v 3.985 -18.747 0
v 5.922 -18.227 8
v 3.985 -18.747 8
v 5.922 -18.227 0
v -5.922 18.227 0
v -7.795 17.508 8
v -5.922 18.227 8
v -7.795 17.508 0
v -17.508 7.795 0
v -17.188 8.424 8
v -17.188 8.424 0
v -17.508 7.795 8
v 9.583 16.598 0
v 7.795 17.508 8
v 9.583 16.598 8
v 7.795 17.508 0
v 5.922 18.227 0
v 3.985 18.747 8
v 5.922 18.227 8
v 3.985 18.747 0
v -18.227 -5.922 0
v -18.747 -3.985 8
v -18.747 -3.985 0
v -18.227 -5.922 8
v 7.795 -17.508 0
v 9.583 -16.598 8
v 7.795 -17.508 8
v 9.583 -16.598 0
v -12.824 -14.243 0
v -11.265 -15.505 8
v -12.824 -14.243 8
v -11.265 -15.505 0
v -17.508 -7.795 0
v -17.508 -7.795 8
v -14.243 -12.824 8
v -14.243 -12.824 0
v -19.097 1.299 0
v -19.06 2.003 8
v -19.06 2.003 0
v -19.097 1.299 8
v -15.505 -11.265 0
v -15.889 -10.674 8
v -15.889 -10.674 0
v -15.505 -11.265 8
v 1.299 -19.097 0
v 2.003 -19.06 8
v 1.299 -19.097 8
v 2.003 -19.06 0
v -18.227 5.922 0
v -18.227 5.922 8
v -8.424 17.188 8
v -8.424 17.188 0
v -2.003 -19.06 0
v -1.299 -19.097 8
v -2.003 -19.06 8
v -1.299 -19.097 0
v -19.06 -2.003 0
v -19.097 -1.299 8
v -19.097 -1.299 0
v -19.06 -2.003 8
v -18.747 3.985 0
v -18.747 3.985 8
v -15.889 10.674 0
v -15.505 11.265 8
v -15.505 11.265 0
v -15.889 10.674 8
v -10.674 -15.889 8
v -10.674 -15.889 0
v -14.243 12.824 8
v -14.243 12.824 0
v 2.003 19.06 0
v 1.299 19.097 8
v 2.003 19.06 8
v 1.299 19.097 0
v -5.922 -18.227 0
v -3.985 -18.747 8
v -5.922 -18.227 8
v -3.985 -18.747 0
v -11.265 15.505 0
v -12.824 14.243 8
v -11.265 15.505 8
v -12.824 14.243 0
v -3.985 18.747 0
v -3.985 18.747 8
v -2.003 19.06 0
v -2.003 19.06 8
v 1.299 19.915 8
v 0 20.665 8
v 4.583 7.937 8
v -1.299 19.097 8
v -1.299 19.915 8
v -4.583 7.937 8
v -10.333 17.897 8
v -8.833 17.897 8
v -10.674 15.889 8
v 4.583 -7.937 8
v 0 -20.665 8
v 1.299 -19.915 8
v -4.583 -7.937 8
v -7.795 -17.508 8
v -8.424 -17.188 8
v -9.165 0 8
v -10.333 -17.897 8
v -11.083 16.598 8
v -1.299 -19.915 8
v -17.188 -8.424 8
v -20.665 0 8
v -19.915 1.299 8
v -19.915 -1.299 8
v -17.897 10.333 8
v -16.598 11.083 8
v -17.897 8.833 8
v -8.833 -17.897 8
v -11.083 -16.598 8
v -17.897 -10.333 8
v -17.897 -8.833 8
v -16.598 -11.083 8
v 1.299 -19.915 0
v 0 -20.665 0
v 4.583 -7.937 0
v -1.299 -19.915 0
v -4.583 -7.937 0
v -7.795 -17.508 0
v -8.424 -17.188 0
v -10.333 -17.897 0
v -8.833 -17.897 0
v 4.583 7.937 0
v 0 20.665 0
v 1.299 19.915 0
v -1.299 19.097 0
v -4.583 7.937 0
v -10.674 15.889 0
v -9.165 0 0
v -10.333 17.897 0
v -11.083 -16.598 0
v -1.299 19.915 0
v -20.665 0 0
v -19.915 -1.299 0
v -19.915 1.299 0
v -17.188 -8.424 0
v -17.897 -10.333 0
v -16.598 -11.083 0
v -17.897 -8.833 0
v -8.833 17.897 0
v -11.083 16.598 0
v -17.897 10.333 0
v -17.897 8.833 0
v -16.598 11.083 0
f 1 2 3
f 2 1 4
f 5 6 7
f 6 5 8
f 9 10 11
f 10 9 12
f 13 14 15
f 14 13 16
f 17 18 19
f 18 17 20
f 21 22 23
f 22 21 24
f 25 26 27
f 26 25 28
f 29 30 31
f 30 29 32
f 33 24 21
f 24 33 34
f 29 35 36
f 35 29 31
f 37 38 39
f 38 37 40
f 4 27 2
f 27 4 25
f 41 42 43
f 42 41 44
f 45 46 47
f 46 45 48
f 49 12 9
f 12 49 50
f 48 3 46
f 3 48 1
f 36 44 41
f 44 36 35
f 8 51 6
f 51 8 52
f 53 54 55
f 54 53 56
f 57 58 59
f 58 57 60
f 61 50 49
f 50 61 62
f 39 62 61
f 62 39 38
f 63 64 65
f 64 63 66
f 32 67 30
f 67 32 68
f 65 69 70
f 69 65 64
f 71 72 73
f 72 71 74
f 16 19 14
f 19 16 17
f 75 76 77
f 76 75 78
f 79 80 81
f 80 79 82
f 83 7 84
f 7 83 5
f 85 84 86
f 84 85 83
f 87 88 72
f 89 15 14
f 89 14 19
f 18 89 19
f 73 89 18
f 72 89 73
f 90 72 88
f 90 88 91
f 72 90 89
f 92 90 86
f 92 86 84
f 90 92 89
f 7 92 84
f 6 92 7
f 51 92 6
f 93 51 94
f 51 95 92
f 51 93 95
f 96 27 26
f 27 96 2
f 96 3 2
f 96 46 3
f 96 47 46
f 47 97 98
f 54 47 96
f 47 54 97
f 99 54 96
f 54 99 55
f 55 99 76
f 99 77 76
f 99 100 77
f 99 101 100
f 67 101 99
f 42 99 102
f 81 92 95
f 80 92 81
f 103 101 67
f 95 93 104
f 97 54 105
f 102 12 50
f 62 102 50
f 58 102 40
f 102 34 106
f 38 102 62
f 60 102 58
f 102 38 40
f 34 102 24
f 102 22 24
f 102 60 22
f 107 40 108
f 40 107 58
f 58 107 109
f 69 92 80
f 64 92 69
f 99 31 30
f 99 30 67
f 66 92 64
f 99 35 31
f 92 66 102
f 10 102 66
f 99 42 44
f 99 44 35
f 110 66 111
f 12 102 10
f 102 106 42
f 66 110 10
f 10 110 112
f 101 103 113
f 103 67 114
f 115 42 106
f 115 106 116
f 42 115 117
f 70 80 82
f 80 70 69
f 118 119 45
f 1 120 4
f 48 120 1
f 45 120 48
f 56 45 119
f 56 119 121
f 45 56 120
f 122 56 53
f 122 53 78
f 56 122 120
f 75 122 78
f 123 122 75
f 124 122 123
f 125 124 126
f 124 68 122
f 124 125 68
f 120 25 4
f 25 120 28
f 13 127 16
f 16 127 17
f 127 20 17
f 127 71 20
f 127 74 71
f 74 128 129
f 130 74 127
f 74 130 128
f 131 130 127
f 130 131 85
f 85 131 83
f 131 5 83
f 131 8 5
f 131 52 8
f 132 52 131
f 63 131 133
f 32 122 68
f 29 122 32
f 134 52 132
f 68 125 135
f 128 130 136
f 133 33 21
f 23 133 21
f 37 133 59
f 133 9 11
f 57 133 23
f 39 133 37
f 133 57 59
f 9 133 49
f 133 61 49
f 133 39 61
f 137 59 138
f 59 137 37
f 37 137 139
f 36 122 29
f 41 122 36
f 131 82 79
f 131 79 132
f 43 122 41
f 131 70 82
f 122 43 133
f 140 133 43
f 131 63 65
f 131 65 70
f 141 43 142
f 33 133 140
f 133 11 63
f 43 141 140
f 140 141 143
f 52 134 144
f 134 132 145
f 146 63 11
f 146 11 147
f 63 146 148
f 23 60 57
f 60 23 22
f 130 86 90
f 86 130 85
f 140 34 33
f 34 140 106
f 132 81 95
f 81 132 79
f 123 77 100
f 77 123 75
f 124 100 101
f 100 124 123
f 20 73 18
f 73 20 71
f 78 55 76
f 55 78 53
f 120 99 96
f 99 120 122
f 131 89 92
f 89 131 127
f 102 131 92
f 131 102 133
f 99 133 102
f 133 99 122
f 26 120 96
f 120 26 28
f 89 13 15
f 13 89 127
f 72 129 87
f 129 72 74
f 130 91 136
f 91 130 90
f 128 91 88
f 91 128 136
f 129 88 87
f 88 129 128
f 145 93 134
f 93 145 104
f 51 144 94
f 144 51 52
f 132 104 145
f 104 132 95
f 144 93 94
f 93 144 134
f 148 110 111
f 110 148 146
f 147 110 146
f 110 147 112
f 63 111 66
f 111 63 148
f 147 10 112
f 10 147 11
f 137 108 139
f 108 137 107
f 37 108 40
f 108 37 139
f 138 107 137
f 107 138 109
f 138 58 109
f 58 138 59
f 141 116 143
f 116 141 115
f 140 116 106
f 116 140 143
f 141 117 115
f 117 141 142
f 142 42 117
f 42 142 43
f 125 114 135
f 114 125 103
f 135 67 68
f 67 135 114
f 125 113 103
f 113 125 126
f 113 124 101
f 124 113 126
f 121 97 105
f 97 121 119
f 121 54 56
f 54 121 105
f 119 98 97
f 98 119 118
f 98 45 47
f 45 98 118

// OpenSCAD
// Parametric Hex Wrench Tool for Tight Spaces
// This tool has an opening on one side to allow insertion into tight spaces

// Parameters
hex_size = 15.875;    // Face to face distance of hex nut (5/8 inch = 15.875mm)
wrench_depth = 8;     // Thickness of the working part of the wrench (mm)
opening_size = 120;    // Angle to open up one side (degrees)
wall_thickness = 10; // Wall thickness of the wrench body (mm)

// to deal with z fighting 
poop = 0.1;

// Main wrench body
module hex_wrench(hex_size_param = hex_size) {
    // Convert face-to-face distance to radius (corner-to-corner = face-to-face * 2/sqrt(3))
    hex_radius_param = hex_size_param * 1/sqrt(3);
    outer_radius_param = hex_radius_param + wall_thickness;
    
    difference() {
        // Outer cylinder
        cylinder(h = wrench_depth, r = outer_radius_param, $fn = 60);
        
        // Inner hex cutout
        translate([0,0,-poop])
        cylinder(h = wrench_depth + 2*poop, r = hex_radius_param, $fn = 6);
        
        // Opening cutout with offset starting point and angle
        rotate([0, 0, -opening_size/2]) // Offset starting point to the corner of the hex
        translate([0, 0, -0.5])
        linear_extrude(height = wrench_depth + 1)
        polygon([
            [0, 0],
            [outer_radius_param * 2, 0],
            [outer_radius_param * 2 * cos(opening_size), outer_radius_param * 2 * sin(opening_size)],
            [0, 0]
        ]);
    }
}

// Add grip pattern to the main wrench body
module wrench_with_grip(hex_size_param = hex_size) {
    // Convert face-to-face distance to radius (corner-to-corner = face-to-face * 2/sqrt(3))
    hex_radius_param = hex_size_param * 1/sqrt(3);
    outer_radius_param = hex_radius_param + wall_thickness;
    
    union() {
        // Main wrench body
        hex_wrench(hex_size_param);
        
        // Subtle grip pattern on the outer surface
        for (i = [0:10]) {
            angle = i * 30;
            // Skip protrusions that would be in the opening cutout area
            if (angle < 360 - opening_size/2 && angle > opening_size/2) {
                rotate([0, 0, angle])
                translate([outer_radius_param, 0, 0])
                cylinder(h = wrench_depth, r = 1.5, $fn = 6);
            }
        }
    }
}

// Render the complete wrench
wrench_with_grip(hex_size);

// Echo parameters for verification
echo("Hex Wrench Parameters:");
echo("Hex size (face to face):", hex_size, "mm");
echo("Wrench depth:", wrench_depth, "mm");
echo("Opening angle:", opening_size, "degrees");
echo("Wall thickness:", wall_thickness, "mm");
